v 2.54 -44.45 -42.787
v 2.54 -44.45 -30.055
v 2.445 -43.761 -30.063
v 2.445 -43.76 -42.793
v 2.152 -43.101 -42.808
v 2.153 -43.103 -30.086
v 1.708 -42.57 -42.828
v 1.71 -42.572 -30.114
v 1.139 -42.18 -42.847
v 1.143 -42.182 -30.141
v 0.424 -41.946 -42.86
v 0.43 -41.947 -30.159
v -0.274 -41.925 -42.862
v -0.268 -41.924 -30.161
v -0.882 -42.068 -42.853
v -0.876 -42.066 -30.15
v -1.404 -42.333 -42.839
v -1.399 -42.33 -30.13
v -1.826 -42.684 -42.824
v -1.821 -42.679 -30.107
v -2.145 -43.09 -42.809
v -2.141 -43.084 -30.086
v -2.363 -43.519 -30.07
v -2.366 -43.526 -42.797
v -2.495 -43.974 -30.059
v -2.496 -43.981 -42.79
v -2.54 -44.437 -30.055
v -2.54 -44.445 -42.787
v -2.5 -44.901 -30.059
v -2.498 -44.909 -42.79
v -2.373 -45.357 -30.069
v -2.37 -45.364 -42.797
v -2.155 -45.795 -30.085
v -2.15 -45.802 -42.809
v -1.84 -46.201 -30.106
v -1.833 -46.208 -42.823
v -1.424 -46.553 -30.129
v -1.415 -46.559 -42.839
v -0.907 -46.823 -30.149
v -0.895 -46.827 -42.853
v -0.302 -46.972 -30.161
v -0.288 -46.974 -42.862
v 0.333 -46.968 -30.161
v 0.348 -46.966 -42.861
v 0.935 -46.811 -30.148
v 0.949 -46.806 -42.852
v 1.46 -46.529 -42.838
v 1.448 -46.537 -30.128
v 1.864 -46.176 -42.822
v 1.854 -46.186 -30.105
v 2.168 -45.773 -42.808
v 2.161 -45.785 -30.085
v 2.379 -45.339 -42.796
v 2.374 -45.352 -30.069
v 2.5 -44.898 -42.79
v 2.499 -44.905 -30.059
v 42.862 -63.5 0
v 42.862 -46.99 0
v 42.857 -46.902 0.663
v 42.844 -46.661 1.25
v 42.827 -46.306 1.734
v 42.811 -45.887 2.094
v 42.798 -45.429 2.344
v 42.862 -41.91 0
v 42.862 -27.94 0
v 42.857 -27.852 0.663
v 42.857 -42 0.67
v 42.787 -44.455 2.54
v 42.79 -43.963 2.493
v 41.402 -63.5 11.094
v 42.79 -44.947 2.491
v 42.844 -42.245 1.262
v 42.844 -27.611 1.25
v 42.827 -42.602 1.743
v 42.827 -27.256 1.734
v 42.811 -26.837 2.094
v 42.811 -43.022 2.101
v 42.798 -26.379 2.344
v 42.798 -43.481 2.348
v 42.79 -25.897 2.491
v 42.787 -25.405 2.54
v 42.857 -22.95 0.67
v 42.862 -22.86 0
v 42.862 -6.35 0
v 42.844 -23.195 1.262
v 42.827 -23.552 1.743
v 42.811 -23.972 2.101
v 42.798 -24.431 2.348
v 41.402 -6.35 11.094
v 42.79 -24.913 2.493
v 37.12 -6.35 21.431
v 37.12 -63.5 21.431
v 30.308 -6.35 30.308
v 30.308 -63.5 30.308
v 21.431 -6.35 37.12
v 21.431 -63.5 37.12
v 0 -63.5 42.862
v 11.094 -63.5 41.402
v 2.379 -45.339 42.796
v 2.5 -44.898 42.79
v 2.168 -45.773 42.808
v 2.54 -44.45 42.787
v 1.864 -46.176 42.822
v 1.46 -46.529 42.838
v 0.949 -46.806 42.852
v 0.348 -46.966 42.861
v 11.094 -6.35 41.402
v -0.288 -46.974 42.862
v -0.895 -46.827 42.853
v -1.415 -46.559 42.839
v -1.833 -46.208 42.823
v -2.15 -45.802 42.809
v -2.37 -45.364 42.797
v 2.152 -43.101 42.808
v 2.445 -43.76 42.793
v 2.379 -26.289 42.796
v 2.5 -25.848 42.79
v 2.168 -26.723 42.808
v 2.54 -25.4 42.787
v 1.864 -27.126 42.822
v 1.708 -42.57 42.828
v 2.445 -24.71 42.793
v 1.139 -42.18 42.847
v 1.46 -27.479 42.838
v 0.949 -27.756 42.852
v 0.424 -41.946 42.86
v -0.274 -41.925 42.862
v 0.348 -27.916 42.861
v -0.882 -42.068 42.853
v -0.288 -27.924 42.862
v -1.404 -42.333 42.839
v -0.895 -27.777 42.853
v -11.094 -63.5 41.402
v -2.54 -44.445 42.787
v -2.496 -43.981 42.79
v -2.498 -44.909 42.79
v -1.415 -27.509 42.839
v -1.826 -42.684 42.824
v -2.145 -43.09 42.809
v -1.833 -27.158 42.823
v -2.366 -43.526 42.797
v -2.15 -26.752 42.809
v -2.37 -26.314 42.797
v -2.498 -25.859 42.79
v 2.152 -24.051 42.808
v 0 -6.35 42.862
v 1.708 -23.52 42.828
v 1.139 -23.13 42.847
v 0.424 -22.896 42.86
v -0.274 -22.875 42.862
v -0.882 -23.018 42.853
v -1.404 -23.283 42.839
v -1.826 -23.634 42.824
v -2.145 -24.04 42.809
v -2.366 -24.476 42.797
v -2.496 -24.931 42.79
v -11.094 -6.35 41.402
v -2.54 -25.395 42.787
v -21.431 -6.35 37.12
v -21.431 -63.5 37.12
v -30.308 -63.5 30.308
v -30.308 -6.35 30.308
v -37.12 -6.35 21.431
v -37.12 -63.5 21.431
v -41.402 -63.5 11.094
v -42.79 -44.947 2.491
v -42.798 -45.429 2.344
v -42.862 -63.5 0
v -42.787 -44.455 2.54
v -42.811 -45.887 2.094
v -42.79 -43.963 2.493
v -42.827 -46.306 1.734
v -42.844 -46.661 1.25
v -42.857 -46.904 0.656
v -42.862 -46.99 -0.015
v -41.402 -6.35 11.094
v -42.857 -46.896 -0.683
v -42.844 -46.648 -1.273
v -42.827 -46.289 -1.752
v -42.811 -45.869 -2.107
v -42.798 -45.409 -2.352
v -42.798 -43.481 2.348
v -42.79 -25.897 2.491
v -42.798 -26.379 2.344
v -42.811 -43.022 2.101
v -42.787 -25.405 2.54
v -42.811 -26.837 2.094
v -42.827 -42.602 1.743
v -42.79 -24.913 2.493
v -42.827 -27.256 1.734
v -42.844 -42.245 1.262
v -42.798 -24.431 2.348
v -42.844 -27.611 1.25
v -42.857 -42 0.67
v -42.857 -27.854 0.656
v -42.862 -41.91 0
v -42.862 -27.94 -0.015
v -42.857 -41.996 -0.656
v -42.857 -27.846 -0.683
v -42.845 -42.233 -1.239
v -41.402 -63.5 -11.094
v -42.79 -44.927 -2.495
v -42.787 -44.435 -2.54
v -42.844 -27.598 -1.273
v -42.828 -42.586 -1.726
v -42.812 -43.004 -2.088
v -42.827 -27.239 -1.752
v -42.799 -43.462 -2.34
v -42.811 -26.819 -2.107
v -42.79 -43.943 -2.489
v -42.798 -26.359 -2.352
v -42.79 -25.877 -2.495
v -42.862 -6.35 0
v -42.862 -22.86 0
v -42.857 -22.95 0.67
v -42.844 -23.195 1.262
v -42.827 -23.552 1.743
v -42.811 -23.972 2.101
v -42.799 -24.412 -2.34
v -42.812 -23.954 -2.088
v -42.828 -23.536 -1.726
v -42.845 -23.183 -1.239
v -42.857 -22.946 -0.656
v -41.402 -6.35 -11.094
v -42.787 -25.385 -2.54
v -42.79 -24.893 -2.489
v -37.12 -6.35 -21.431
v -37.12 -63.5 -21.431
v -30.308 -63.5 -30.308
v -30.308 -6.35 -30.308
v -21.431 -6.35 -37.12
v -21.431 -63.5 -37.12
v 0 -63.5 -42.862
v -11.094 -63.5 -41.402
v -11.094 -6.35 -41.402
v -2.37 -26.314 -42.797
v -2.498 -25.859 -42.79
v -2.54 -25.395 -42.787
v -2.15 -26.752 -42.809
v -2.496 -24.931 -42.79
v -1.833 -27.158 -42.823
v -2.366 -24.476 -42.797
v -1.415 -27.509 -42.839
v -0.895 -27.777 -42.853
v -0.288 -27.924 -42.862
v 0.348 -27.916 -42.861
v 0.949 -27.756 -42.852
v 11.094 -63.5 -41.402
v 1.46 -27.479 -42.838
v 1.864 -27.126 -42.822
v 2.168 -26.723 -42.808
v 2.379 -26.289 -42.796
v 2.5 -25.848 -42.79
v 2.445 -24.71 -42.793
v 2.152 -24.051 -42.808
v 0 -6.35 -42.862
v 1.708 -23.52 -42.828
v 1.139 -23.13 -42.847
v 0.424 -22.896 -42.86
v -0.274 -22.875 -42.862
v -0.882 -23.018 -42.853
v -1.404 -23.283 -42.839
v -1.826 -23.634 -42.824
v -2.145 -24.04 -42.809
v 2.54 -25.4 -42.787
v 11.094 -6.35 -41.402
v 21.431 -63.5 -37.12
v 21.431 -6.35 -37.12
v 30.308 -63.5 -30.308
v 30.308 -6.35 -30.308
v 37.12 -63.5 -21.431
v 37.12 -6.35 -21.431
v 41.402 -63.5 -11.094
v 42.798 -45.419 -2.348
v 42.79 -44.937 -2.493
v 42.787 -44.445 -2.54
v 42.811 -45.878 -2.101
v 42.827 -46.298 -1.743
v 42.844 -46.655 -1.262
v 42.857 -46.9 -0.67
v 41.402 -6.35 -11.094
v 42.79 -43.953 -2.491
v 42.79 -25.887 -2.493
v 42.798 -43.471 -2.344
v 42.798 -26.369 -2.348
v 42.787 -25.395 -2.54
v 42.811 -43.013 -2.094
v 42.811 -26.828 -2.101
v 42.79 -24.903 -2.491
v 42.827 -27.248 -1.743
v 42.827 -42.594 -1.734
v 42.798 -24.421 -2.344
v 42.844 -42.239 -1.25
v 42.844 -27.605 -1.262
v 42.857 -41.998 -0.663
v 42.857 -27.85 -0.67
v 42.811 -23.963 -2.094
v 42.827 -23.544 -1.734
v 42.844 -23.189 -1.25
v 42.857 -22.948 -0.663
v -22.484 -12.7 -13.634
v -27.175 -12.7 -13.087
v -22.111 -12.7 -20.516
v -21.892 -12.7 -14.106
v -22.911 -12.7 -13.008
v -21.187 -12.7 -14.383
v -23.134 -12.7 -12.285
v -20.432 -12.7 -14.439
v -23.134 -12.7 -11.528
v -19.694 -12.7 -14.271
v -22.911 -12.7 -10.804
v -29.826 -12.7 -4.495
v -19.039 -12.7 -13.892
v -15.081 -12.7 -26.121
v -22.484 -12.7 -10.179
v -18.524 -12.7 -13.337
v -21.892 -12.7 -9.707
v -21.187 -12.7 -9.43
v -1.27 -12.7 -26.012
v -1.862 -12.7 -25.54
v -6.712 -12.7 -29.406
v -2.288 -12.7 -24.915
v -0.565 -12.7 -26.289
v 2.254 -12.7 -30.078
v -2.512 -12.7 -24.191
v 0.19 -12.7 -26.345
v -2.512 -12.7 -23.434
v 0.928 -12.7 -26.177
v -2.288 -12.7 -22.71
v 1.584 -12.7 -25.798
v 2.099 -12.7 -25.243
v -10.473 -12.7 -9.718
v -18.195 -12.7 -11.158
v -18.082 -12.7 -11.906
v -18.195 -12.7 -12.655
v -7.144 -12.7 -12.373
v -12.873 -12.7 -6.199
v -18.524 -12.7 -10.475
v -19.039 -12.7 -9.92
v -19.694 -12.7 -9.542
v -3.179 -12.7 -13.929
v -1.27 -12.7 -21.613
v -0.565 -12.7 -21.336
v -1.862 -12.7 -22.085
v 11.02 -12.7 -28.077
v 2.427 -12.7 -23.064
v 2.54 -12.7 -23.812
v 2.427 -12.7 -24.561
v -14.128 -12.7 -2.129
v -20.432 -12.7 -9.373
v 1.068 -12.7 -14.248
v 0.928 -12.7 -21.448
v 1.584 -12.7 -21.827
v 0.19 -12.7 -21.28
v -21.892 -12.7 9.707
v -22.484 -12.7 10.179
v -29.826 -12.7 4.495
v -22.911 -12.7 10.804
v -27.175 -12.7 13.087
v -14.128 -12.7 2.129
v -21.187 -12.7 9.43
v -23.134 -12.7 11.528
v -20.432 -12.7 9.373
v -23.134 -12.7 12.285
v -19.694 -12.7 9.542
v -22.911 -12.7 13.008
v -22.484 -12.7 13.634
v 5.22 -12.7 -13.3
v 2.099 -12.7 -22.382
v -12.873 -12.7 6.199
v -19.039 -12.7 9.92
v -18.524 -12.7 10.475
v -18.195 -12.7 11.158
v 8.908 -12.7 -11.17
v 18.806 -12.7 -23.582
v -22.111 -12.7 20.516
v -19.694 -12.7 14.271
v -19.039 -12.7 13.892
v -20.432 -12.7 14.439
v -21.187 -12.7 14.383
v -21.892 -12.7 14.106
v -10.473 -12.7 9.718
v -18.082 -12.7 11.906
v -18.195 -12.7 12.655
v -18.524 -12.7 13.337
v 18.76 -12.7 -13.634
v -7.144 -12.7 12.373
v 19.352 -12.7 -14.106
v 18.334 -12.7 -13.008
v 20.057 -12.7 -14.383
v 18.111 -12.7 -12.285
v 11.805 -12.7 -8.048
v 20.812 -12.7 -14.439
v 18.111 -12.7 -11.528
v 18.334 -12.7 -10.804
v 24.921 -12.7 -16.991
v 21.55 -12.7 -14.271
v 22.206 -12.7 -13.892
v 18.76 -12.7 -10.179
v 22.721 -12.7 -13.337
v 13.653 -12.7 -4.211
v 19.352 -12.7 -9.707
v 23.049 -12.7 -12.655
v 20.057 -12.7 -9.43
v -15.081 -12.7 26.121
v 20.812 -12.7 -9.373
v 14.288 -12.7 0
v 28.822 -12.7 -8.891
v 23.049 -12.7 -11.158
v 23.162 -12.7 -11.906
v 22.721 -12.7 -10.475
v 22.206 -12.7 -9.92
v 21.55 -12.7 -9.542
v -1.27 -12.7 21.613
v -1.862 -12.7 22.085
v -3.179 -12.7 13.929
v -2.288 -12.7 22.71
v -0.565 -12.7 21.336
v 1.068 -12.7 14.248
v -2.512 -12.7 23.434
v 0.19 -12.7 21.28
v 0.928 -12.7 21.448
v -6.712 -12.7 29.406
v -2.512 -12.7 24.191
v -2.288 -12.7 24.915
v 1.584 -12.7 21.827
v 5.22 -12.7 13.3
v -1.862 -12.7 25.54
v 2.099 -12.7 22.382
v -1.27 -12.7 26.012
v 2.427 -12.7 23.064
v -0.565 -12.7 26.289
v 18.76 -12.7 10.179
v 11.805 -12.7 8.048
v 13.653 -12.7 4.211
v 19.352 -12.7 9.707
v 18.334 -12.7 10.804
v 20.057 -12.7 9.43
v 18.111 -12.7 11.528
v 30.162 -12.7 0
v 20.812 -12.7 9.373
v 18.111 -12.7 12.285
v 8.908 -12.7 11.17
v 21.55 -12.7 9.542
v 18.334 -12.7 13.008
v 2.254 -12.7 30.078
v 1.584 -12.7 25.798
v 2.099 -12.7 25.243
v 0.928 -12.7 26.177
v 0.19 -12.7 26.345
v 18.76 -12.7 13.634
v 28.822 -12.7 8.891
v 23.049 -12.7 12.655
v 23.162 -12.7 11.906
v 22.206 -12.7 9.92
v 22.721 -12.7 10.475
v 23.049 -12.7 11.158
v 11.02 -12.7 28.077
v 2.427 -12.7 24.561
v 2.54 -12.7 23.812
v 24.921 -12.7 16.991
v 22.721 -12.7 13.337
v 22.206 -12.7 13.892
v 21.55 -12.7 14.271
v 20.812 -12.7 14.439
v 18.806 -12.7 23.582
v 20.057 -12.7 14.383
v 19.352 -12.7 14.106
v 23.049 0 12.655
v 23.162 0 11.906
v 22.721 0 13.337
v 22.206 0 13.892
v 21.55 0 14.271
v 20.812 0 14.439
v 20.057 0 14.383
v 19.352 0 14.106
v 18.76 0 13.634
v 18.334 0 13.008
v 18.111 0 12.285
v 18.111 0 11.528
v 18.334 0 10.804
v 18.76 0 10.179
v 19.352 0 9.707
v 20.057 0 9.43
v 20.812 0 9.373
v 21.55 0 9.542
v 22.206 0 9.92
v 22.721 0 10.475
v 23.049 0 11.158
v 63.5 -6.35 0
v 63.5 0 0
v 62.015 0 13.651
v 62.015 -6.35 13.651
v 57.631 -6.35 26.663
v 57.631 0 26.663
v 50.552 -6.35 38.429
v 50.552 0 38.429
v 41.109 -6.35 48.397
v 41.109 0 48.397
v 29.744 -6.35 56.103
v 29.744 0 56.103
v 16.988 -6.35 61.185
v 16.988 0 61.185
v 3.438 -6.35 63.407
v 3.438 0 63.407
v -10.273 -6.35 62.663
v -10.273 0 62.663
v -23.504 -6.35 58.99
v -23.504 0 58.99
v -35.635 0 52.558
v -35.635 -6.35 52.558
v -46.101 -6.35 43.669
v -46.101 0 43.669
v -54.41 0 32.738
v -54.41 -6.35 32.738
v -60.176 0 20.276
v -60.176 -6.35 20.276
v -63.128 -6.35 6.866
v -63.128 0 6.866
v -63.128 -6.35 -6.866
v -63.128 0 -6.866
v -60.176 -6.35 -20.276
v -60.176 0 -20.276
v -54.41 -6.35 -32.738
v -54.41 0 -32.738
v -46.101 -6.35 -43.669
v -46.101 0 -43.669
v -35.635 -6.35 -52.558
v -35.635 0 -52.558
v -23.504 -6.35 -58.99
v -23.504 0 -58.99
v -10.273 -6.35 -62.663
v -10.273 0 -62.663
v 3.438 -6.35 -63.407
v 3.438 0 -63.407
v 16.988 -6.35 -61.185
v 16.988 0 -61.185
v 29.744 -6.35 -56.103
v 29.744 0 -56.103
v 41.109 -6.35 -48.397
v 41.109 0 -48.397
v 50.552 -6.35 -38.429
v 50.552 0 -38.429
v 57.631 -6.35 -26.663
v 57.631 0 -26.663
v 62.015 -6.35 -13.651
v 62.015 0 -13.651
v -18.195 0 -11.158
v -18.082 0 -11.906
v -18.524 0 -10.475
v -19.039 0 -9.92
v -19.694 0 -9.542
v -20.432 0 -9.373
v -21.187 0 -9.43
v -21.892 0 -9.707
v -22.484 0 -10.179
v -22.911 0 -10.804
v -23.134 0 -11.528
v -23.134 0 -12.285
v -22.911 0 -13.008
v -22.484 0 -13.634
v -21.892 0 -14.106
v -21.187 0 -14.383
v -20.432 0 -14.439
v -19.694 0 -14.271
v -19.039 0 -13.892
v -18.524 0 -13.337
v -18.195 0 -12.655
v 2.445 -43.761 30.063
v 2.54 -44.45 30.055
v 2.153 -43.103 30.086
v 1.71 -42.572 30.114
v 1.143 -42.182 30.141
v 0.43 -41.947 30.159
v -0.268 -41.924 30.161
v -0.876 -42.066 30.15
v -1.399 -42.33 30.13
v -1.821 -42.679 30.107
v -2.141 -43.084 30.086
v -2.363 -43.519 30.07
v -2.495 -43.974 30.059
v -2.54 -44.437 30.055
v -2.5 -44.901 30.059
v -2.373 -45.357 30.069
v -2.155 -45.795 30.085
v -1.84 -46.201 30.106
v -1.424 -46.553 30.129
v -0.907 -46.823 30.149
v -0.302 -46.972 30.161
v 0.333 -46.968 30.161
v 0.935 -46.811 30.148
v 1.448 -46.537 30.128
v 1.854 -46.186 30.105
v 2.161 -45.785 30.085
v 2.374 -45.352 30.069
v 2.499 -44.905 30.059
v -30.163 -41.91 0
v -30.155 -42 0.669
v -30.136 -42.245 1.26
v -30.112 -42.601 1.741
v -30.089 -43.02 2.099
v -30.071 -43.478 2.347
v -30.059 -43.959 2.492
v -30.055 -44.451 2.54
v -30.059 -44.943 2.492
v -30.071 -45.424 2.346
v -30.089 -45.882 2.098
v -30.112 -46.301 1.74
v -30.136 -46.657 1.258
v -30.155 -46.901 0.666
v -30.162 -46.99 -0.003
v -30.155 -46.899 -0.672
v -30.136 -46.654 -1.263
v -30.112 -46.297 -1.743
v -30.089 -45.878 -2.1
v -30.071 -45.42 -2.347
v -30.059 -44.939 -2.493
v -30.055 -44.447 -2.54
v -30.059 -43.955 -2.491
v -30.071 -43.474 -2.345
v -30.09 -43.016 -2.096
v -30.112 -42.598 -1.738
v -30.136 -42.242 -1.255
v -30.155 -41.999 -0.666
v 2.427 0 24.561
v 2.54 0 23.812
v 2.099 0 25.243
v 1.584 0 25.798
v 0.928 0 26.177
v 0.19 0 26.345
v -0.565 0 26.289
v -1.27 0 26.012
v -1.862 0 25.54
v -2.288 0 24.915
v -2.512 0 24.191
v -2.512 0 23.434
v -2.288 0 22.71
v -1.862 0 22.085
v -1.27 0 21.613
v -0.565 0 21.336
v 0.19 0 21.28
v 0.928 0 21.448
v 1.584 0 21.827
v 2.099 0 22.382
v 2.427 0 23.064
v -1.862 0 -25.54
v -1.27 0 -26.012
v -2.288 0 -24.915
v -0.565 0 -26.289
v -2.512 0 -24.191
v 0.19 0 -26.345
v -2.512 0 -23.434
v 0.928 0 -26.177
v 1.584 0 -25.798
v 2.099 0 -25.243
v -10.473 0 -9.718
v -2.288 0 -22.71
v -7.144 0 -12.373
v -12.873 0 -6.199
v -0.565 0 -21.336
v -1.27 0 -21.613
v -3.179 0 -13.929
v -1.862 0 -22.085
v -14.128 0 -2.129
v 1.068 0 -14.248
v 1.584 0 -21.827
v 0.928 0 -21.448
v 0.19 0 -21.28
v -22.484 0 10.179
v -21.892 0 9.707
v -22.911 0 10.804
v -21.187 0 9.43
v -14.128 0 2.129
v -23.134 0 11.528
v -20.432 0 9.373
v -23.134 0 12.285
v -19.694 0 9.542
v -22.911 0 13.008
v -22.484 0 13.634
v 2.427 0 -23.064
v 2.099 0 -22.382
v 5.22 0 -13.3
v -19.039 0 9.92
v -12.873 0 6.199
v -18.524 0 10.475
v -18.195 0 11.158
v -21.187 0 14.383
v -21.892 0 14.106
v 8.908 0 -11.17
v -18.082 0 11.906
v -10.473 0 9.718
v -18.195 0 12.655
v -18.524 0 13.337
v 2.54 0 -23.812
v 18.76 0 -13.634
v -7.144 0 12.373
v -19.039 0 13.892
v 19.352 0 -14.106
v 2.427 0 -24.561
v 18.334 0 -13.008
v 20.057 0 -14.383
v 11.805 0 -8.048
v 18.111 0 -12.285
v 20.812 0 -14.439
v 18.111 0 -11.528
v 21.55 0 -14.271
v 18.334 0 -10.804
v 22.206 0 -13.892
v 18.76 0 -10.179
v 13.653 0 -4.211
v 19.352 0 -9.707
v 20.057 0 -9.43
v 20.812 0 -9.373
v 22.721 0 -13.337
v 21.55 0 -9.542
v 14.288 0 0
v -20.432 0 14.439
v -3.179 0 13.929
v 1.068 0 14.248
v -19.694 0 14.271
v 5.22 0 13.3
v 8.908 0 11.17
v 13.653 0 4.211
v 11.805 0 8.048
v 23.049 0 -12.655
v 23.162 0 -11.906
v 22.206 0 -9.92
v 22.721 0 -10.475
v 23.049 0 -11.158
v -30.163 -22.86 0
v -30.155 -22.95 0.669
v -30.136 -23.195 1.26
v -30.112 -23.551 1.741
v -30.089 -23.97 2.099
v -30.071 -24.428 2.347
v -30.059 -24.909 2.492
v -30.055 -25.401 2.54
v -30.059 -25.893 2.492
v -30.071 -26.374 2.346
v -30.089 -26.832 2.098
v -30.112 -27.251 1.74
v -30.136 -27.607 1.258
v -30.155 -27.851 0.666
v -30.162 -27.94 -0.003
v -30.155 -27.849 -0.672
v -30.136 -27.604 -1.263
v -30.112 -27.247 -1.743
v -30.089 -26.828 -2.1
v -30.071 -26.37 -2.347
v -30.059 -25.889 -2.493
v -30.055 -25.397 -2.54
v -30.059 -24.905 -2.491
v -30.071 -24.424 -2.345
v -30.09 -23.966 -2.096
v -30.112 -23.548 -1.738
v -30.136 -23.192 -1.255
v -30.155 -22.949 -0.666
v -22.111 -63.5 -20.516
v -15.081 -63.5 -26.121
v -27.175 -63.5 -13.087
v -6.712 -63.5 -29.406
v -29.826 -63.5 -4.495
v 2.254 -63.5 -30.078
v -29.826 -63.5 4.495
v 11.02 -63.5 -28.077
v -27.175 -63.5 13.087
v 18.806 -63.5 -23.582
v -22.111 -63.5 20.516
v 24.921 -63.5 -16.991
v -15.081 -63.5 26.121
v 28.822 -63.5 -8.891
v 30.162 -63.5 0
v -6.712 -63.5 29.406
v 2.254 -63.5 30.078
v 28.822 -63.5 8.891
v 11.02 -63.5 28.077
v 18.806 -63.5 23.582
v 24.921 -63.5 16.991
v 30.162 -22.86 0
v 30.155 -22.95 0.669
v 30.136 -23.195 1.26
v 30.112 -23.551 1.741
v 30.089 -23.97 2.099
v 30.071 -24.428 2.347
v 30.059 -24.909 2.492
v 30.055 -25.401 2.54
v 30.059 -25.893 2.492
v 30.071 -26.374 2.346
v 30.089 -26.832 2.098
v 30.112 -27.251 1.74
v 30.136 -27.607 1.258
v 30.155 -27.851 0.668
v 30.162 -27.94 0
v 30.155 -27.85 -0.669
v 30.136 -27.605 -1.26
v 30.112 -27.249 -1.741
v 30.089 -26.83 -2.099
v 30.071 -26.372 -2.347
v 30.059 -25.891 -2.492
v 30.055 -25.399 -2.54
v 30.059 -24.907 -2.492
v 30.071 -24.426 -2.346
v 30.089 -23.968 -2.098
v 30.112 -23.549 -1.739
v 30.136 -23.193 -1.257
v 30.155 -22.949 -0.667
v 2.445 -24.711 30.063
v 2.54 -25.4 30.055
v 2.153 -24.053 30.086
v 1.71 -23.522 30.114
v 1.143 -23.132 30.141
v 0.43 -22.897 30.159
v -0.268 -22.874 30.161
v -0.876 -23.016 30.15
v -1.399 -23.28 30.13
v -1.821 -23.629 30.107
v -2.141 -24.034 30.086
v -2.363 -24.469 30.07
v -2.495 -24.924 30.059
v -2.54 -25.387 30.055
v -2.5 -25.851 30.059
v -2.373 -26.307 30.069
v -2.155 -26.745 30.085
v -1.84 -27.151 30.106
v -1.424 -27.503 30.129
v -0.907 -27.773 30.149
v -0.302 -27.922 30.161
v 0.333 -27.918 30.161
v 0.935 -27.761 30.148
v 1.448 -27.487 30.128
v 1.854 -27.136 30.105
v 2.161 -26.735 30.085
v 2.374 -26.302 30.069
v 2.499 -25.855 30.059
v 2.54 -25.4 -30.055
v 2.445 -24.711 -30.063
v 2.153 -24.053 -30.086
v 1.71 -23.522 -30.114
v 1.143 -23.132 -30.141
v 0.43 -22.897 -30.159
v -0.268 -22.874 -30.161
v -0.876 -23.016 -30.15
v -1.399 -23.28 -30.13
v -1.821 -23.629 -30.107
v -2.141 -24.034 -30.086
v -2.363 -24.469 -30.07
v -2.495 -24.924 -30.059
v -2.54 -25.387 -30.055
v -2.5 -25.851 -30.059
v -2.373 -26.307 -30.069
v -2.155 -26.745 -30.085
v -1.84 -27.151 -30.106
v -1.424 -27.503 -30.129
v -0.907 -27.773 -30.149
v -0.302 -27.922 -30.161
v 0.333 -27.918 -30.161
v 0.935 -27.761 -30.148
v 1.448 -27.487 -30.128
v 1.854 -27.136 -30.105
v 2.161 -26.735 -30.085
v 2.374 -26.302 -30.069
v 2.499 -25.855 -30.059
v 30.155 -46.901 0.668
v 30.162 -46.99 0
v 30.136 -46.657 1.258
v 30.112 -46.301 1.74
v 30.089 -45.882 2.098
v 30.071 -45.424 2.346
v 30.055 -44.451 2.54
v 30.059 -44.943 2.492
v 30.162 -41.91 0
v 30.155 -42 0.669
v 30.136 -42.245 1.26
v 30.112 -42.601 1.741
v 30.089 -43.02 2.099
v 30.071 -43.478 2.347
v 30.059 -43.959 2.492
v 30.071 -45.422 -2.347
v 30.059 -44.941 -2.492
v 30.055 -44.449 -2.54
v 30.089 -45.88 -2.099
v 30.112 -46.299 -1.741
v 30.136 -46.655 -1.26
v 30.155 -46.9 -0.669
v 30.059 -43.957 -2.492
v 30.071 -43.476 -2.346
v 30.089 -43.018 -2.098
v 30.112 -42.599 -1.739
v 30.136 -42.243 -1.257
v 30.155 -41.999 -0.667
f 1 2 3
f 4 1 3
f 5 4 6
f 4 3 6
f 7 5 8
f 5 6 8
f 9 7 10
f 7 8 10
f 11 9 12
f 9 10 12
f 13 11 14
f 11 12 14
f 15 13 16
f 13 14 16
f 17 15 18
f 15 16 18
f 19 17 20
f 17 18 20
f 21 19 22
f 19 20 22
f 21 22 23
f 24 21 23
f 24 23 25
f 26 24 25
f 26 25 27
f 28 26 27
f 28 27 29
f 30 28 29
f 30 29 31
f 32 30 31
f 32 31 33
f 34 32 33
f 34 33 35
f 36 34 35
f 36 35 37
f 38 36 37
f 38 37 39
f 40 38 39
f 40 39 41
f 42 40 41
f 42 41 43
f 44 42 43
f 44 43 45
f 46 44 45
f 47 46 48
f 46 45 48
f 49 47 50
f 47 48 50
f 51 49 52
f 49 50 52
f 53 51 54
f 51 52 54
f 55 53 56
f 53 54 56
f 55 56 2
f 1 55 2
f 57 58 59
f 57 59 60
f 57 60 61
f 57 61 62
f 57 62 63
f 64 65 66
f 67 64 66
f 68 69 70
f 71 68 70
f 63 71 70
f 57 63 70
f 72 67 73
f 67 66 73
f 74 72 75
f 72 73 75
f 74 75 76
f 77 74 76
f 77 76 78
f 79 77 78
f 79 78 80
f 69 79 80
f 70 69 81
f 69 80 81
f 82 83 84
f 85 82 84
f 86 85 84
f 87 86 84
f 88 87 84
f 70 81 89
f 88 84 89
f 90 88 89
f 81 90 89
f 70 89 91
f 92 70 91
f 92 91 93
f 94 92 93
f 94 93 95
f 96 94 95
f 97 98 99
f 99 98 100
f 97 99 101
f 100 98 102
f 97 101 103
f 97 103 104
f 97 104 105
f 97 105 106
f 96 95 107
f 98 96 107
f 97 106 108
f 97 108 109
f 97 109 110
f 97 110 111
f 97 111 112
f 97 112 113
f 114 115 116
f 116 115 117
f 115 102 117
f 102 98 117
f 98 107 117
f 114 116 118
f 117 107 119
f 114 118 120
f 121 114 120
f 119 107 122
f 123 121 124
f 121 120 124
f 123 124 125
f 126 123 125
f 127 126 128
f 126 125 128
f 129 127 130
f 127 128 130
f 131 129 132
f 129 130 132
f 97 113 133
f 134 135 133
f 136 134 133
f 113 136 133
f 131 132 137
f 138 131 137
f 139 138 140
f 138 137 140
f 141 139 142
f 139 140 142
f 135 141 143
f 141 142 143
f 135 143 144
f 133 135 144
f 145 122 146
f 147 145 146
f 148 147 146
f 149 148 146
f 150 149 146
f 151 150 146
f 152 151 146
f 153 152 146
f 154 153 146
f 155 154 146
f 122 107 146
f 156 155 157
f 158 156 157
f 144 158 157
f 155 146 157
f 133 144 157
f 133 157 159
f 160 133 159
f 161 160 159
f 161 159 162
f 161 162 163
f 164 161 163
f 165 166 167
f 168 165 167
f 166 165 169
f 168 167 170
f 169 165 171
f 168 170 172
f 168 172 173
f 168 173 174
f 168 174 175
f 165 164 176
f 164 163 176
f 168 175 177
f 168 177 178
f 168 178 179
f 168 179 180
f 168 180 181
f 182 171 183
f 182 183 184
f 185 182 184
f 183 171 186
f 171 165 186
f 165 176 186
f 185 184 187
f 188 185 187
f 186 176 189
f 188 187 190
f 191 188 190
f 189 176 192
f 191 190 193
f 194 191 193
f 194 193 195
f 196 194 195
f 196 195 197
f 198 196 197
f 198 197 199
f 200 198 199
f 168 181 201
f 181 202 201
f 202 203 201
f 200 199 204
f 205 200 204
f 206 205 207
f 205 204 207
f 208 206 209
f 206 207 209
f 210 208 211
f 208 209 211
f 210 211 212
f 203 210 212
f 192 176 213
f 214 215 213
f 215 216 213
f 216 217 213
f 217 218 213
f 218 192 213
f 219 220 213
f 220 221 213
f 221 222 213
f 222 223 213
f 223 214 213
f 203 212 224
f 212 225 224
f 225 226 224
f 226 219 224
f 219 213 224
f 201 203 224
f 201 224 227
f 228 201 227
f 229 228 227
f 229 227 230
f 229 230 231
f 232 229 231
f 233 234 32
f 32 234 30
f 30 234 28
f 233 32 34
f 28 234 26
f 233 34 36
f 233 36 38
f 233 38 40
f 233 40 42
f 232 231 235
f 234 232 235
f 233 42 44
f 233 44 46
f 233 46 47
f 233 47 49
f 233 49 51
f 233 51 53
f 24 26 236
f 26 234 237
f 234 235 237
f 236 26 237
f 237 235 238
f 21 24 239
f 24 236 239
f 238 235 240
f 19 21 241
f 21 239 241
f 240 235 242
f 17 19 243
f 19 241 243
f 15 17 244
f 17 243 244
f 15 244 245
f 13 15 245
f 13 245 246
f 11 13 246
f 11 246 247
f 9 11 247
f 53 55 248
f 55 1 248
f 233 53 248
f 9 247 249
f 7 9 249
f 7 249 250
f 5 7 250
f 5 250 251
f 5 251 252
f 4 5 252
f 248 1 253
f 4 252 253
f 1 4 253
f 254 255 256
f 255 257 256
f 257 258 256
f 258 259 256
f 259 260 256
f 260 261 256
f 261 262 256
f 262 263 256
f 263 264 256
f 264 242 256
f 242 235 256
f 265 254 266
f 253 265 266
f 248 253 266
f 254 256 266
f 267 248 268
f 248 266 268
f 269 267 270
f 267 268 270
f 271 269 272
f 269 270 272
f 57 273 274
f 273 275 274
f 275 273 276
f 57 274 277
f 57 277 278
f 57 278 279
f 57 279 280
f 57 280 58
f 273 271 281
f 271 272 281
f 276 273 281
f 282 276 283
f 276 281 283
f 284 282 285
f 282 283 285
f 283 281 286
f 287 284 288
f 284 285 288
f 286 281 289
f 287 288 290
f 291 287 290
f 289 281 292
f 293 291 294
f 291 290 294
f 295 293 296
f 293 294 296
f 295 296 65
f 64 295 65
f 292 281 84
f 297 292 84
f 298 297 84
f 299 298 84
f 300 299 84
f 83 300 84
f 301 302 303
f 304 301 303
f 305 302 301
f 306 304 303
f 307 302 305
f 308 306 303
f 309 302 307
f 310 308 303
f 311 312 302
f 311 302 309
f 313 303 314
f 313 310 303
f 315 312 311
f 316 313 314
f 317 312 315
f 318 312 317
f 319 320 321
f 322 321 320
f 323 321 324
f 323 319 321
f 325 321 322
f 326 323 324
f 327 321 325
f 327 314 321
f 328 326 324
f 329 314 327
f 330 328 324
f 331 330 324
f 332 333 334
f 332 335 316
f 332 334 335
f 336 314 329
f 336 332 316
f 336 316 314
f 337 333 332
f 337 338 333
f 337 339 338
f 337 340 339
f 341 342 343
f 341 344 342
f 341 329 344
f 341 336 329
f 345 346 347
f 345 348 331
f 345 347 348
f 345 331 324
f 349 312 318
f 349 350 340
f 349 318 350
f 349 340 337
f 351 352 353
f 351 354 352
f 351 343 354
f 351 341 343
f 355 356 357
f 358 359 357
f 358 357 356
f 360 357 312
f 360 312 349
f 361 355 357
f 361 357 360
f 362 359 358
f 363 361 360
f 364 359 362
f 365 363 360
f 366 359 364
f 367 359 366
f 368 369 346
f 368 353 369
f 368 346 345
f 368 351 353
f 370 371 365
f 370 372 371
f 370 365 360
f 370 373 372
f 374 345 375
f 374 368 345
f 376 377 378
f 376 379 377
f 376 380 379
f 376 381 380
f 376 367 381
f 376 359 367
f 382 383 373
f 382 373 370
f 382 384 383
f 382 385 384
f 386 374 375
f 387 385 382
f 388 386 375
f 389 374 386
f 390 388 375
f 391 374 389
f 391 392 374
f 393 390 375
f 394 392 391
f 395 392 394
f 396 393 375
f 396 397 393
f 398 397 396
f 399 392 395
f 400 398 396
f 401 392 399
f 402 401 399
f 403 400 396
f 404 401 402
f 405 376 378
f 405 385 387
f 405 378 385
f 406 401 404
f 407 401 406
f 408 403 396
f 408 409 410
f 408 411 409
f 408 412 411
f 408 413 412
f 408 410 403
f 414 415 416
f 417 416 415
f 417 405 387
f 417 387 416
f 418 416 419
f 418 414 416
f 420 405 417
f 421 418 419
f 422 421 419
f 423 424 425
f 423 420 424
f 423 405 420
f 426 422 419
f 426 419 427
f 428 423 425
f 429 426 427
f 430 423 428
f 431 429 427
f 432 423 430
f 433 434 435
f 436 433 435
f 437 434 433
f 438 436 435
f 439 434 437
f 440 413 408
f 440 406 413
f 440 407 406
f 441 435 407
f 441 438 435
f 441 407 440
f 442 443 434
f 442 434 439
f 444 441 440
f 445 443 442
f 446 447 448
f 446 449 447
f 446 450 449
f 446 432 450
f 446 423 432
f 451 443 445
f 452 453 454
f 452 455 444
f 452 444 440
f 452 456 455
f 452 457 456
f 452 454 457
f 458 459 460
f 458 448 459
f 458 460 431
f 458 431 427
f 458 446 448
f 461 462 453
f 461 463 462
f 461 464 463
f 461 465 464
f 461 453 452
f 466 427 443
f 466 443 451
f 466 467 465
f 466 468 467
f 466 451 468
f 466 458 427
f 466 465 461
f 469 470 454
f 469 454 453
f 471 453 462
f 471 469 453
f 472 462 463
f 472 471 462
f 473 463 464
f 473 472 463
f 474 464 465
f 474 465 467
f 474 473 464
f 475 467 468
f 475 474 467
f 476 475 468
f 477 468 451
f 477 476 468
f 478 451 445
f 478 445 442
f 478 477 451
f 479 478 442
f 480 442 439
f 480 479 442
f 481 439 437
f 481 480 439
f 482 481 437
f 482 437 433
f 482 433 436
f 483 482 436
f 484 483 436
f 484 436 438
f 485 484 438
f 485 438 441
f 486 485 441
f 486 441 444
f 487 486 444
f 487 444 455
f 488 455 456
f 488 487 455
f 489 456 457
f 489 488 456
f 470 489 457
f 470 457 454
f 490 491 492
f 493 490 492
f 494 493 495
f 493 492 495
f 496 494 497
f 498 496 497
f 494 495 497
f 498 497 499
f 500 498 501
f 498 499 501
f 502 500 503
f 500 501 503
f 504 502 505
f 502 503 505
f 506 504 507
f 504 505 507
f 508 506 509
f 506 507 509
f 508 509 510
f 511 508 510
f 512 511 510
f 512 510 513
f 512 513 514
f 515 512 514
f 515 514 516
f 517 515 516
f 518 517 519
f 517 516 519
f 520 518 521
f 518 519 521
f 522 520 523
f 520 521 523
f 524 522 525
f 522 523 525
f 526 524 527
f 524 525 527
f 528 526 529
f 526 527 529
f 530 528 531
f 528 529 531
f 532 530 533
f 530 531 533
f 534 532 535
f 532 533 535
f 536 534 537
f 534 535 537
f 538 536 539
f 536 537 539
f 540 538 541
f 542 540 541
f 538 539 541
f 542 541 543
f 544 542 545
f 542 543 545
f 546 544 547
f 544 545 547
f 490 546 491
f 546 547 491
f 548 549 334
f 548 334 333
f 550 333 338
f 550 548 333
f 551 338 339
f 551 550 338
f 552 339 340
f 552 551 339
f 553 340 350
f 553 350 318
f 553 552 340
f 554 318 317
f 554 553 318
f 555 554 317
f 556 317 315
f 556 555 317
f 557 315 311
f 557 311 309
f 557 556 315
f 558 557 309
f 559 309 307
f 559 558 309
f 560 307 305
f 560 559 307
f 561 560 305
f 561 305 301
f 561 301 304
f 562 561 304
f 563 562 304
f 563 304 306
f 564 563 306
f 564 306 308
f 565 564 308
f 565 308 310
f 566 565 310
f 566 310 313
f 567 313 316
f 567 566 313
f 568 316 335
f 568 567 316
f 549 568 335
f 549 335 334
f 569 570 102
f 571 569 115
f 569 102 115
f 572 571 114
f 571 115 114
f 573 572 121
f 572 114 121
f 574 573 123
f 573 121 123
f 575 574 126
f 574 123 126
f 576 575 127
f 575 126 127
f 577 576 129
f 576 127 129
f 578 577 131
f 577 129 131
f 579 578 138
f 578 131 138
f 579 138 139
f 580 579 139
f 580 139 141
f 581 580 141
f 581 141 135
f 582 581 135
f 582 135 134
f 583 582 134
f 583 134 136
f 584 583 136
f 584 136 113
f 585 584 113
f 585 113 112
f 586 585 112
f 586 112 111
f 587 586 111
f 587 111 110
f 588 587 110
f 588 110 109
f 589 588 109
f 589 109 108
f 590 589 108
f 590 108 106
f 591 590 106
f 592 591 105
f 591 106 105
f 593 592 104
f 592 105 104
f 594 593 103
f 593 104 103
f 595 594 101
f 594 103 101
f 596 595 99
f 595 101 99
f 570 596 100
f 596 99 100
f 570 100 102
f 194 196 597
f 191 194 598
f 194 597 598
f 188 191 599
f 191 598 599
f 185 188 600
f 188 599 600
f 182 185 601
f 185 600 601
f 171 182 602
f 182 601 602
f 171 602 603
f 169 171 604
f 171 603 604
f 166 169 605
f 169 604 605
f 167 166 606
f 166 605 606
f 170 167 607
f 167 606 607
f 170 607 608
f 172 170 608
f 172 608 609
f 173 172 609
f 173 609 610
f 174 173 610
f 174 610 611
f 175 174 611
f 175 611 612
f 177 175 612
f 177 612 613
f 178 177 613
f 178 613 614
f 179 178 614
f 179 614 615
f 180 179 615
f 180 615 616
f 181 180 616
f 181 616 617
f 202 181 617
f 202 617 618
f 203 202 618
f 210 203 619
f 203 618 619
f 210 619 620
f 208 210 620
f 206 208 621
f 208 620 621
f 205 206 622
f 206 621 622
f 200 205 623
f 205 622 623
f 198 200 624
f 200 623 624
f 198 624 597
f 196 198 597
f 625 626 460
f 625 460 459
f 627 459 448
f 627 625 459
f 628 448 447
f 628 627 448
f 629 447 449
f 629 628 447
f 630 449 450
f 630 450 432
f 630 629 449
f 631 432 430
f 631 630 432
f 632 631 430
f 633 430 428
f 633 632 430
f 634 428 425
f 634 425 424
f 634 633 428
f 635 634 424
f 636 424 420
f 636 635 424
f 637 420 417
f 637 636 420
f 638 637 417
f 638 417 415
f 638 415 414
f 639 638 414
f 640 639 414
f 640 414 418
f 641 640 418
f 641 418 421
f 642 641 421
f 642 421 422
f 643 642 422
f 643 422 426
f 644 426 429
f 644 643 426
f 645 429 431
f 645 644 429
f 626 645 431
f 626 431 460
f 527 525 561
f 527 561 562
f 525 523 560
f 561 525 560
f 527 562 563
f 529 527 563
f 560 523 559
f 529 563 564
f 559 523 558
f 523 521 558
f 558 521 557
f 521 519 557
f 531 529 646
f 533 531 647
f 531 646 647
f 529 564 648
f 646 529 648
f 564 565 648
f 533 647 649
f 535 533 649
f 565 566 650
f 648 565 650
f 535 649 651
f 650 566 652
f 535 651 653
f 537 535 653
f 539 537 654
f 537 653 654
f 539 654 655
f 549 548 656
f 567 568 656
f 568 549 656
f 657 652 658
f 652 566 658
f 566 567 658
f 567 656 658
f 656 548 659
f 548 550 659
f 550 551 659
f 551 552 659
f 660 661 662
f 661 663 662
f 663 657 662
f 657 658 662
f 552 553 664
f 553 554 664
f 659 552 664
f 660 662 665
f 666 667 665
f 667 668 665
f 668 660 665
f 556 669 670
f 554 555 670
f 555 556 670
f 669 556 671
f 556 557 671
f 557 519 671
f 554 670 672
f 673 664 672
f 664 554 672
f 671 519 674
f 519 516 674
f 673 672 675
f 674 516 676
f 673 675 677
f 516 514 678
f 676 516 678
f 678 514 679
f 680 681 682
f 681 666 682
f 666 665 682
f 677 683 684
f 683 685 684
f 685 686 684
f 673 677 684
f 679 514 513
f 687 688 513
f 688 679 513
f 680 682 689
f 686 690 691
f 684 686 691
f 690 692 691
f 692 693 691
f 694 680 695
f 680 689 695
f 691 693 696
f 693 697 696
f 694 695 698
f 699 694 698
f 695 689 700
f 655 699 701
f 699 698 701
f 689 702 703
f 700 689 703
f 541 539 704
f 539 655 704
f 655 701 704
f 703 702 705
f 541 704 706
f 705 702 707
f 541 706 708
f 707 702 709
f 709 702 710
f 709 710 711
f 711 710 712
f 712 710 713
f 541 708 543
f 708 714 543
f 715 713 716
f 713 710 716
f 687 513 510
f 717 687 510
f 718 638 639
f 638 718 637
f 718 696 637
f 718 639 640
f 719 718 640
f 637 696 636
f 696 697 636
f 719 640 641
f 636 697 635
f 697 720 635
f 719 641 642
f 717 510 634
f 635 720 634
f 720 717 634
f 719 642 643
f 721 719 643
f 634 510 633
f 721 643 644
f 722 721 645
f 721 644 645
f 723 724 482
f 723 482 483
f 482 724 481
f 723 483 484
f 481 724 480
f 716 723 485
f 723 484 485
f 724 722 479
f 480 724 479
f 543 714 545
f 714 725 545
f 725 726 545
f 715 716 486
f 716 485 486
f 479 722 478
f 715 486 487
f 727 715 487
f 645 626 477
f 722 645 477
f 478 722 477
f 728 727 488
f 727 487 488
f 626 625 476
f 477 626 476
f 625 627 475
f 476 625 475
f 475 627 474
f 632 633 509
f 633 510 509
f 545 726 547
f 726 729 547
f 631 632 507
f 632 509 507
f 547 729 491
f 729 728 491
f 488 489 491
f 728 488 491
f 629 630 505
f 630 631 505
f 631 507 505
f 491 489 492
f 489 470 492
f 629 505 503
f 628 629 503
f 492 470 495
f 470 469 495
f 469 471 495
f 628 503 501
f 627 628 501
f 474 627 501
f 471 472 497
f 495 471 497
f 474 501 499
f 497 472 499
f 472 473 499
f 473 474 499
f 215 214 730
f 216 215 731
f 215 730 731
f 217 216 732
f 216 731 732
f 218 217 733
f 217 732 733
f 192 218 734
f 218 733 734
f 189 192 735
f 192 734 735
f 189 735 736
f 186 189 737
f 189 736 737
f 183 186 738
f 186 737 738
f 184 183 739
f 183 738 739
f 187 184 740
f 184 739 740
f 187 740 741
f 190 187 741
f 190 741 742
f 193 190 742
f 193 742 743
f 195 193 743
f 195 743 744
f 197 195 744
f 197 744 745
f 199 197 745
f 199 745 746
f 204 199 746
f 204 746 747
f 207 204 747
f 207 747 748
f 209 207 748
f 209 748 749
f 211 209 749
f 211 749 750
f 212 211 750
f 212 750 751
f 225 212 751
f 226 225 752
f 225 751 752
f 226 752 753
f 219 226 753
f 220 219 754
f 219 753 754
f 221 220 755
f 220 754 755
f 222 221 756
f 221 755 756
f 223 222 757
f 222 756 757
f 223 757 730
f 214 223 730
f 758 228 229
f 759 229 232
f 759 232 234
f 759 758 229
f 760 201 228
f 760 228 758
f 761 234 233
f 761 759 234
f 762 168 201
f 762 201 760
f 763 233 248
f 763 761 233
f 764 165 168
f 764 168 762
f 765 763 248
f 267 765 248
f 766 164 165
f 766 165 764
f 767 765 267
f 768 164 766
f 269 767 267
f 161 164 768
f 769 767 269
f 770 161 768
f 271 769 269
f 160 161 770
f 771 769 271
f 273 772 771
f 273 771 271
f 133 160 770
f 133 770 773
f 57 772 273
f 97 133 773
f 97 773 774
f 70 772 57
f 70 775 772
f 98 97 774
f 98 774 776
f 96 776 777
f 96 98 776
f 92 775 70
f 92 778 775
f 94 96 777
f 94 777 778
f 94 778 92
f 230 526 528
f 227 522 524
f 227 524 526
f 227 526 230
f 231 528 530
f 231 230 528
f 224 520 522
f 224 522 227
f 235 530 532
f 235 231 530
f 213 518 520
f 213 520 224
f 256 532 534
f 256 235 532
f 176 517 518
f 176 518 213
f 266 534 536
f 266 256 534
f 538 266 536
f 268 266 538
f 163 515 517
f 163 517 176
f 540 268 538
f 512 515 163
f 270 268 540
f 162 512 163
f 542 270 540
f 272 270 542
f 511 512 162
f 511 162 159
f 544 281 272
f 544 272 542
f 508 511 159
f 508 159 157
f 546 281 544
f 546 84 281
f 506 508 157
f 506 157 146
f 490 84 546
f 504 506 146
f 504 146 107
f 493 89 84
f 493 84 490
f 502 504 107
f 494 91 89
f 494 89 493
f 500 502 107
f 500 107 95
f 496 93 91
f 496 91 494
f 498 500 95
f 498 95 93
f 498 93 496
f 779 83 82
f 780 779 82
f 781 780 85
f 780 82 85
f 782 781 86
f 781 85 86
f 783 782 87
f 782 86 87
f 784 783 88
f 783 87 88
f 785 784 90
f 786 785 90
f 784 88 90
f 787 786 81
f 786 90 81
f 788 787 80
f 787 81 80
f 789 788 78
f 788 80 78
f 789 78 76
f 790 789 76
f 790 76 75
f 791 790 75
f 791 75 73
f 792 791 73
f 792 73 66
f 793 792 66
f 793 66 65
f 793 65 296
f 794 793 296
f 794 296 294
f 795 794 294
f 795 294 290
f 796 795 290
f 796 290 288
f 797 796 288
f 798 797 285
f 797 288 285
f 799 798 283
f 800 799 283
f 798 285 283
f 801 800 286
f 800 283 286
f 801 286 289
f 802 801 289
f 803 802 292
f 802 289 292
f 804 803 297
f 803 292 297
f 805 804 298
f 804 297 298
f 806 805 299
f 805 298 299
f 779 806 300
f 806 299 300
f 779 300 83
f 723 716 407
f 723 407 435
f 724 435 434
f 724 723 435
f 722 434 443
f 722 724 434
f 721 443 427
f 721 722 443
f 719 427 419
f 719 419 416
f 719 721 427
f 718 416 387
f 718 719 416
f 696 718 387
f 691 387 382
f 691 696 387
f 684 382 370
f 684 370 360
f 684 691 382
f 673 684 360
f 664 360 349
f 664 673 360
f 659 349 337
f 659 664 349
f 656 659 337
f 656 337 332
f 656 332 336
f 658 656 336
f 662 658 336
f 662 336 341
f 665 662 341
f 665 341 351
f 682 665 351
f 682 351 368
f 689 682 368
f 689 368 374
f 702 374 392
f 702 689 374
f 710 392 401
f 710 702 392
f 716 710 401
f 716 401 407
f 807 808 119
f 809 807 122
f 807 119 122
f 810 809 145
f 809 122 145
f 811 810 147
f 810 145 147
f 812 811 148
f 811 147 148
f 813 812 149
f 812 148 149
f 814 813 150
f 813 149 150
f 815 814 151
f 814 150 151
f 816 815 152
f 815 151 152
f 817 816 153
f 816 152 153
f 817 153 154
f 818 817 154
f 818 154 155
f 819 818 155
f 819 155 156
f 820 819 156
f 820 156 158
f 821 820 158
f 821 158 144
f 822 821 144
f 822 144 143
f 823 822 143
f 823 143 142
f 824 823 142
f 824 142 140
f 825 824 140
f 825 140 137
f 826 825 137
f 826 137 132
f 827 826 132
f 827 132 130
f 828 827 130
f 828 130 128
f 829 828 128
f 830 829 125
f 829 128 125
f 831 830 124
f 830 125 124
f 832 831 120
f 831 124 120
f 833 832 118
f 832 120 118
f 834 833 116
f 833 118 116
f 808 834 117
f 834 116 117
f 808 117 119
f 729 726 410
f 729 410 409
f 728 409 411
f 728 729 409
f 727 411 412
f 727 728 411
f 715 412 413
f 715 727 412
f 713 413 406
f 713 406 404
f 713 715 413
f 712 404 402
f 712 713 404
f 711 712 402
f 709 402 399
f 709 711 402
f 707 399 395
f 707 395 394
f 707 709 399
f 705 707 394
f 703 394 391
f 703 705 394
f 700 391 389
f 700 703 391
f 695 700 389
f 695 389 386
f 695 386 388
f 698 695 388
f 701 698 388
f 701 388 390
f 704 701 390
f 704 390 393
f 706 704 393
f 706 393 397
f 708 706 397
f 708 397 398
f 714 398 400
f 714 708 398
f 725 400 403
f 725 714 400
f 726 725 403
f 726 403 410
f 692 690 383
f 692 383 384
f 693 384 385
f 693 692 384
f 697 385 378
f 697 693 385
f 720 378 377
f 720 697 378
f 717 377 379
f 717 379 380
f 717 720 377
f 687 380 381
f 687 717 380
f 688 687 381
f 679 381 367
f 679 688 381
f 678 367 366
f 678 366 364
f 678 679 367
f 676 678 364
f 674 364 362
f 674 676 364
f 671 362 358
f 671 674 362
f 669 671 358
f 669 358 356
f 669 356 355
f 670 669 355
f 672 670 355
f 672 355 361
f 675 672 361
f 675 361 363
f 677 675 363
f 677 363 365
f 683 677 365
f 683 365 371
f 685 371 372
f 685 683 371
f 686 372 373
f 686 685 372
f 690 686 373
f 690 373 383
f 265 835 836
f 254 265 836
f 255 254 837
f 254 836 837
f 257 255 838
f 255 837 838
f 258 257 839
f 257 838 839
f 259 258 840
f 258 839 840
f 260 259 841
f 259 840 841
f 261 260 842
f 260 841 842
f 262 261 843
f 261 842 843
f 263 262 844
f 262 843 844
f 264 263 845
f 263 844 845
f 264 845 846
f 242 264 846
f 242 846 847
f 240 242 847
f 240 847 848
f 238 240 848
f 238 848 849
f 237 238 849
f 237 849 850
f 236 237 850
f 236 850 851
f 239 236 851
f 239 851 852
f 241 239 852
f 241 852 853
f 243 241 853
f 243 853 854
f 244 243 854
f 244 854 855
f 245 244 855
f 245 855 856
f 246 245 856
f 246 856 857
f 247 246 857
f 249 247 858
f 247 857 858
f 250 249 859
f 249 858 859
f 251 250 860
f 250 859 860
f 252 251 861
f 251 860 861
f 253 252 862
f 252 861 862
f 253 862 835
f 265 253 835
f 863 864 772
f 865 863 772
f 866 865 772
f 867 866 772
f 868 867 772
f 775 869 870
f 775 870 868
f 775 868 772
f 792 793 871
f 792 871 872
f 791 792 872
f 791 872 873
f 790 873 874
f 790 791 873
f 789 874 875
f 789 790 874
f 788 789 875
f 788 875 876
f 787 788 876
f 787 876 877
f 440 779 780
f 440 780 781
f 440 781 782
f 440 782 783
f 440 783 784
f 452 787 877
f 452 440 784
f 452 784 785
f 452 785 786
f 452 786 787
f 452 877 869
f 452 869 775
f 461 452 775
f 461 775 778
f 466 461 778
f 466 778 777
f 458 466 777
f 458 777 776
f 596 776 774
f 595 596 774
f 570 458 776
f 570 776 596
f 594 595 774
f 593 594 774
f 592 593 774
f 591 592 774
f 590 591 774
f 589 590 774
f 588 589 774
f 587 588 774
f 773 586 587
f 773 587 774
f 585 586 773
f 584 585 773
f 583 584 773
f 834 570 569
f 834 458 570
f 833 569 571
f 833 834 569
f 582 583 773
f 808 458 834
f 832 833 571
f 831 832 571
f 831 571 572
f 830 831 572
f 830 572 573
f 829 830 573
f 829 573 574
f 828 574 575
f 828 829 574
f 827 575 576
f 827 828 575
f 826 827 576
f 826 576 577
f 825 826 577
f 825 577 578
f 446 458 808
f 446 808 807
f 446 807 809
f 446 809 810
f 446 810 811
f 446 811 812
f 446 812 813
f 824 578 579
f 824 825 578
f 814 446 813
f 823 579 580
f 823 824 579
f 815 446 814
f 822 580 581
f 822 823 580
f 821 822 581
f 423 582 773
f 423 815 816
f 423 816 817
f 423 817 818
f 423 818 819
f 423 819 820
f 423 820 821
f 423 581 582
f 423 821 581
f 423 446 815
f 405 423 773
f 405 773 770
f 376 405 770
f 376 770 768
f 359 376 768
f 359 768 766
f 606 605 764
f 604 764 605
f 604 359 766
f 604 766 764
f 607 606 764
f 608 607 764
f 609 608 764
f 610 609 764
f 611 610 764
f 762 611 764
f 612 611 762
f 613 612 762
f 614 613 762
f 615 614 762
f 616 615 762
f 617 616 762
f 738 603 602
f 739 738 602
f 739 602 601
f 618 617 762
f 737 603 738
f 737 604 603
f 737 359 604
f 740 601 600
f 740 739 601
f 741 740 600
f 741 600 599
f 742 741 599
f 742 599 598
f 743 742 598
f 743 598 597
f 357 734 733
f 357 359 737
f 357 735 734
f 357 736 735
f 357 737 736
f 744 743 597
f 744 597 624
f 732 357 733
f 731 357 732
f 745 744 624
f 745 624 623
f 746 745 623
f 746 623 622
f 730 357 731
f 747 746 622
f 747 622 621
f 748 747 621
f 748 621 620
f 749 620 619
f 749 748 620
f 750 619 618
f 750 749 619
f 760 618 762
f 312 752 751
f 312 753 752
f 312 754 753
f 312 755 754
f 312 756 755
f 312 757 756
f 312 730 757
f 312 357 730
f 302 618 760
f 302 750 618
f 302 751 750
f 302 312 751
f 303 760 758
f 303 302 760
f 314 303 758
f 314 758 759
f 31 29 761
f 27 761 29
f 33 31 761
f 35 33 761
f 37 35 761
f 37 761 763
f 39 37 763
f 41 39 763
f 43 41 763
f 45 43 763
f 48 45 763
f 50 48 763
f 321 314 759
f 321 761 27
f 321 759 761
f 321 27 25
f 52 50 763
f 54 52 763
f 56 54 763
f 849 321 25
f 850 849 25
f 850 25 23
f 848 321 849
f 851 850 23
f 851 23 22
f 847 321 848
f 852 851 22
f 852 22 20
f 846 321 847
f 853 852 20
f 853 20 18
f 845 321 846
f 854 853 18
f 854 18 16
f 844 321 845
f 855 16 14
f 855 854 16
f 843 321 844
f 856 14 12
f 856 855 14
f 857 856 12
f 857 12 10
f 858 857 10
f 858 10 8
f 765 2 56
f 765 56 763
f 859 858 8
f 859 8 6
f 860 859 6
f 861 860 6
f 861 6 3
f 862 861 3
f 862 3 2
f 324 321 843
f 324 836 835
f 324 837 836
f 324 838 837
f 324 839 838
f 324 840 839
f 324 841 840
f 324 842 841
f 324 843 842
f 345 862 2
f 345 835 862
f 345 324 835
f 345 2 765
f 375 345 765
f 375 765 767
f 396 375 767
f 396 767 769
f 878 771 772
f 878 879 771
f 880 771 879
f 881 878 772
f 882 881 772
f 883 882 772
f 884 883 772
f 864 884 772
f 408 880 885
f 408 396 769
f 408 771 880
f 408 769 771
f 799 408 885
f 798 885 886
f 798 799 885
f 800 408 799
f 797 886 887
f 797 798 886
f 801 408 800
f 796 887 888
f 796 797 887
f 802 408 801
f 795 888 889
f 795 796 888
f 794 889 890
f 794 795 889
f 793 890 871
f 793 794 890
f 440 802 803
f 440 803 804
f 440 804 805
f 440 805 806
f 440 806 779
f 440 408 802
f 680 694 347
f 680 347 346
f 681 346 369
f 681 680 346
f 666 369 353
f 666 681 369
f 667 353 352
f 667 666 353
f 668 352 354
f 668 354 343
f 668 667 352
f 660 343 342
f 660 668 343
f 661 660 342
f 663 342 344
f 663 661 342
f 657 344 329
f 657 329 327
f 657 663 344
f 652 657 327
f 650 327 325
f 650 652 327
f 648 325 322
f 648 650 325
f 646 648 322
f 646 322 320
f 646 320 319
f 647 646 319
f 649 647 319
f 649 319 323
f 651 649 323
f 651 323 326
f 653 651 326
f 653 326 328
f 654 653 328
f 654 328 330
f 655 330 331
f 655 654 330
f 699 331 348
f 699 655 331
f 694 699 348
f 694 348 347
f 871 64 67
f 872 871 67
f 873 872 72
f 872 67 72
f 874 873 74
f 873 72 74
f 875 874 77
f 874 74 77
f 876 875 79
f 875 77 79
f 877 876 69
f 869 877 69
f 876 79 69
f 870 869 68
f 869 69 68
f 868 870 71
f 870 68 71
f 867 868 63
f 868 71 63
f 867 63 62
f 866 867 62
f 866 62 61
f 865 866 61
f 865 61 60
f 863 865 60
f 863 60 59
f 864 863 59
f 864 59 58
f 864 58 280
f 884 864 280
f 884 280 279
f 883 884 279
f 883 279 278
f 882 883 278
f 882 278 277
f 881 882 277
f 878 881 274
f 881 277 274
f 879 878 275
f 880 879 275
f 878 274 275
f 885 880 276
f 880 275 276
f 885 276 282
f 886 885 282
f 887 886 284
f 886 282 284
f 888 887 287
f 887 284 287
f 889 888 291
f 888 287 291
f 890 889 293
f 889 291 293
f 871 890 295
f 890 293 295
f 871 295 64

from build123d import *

# Parameters (mm, degrees)
F0_R     = 42.8625
F0_R_2   = 30.1625
F1_DEPTH = 63.5
F0_R_3   = 63.5
F2_DEPTH = 6.35
F0_R_4   = 2.54
F0_R_5   = 14.2875
F3_DEPTH = 12.7
F5_R     = 2.54
F6_DEPTH = 101.6
F8_R     = 2.54
F9_DEPTH = 101.6


with BuildPart() as f1:
    # F0 (on Front) → F1 (new body)
    with BuildSketch(Plane.XZ):
        Circle(F0_R)
        Circle(F0_R_2, mode=Mode.SUBTRACT)
    extrude(amount=F1_DEPTH)

    # F0 (on Front) → F2 (join)
    with BuildSketch(Plane.XZ):
        Circle(F0_R_3)
        Circle(F0_R, mode=Mode.SUBTRACT)
    extrude(amount=F2_DEPTH)

    # F0 (on Front) → F3 (join)
    with BuildSketch(Plane.XZ):
        Circle(F0_R_2)
        with Locations((-20.62223, -11.90625)):
            Circle(F0_R_4, mode=Mode.SUBTRACT)
        with Locations((0, -23.8125)):
            Circle(F0_R_4, mode=Mode.SUBTRACT)
        with Locations((20.62223, -11.90625)):
            Circle(F0_R_4, mode=Mode.SUBTRACT)
        with Locations((-20.62223, 11.90625)):
            Circle(F0_R_4, mode=Mode.SUBTRACT)
        Circle(F0_R_5, mode=Mode.SUBTRACT)
        with Locations((20.62223, 11.90625)):
            Circle(F0_R_4, mode=Mode.SUBTRACT)
        with Locations((0, 23.8125)):
            Circle(F0_R_4, mode=Mode.SUBTRACT)
    extrude(amount=F3_DEPTH)

    # F5 (on offset) → F6 (cut)
    with BuildSketch(Plane.YZ.offset(45.212)):
        with Locations((-25.4, 0)):
            Circle(F5_R)
        with Locations((-44.45, 0)):
            Circle(F5_R)
    extrude(amount=-F6_DEPTH, mode=Mode.SUBTRACT)

    # F8 (on offset) → F9 (cut)
    with BuildSketch(Plane.XY.offset(44.196)):
        with Locations((0, -25.4)):
            Circle(F8_R)
        with Locations((0, -44.45)):
            Circle(F8_R)
    extrude(amount=-F9_DEPTH, mode=Mode.SUBTRACT)


solid = f1.part
